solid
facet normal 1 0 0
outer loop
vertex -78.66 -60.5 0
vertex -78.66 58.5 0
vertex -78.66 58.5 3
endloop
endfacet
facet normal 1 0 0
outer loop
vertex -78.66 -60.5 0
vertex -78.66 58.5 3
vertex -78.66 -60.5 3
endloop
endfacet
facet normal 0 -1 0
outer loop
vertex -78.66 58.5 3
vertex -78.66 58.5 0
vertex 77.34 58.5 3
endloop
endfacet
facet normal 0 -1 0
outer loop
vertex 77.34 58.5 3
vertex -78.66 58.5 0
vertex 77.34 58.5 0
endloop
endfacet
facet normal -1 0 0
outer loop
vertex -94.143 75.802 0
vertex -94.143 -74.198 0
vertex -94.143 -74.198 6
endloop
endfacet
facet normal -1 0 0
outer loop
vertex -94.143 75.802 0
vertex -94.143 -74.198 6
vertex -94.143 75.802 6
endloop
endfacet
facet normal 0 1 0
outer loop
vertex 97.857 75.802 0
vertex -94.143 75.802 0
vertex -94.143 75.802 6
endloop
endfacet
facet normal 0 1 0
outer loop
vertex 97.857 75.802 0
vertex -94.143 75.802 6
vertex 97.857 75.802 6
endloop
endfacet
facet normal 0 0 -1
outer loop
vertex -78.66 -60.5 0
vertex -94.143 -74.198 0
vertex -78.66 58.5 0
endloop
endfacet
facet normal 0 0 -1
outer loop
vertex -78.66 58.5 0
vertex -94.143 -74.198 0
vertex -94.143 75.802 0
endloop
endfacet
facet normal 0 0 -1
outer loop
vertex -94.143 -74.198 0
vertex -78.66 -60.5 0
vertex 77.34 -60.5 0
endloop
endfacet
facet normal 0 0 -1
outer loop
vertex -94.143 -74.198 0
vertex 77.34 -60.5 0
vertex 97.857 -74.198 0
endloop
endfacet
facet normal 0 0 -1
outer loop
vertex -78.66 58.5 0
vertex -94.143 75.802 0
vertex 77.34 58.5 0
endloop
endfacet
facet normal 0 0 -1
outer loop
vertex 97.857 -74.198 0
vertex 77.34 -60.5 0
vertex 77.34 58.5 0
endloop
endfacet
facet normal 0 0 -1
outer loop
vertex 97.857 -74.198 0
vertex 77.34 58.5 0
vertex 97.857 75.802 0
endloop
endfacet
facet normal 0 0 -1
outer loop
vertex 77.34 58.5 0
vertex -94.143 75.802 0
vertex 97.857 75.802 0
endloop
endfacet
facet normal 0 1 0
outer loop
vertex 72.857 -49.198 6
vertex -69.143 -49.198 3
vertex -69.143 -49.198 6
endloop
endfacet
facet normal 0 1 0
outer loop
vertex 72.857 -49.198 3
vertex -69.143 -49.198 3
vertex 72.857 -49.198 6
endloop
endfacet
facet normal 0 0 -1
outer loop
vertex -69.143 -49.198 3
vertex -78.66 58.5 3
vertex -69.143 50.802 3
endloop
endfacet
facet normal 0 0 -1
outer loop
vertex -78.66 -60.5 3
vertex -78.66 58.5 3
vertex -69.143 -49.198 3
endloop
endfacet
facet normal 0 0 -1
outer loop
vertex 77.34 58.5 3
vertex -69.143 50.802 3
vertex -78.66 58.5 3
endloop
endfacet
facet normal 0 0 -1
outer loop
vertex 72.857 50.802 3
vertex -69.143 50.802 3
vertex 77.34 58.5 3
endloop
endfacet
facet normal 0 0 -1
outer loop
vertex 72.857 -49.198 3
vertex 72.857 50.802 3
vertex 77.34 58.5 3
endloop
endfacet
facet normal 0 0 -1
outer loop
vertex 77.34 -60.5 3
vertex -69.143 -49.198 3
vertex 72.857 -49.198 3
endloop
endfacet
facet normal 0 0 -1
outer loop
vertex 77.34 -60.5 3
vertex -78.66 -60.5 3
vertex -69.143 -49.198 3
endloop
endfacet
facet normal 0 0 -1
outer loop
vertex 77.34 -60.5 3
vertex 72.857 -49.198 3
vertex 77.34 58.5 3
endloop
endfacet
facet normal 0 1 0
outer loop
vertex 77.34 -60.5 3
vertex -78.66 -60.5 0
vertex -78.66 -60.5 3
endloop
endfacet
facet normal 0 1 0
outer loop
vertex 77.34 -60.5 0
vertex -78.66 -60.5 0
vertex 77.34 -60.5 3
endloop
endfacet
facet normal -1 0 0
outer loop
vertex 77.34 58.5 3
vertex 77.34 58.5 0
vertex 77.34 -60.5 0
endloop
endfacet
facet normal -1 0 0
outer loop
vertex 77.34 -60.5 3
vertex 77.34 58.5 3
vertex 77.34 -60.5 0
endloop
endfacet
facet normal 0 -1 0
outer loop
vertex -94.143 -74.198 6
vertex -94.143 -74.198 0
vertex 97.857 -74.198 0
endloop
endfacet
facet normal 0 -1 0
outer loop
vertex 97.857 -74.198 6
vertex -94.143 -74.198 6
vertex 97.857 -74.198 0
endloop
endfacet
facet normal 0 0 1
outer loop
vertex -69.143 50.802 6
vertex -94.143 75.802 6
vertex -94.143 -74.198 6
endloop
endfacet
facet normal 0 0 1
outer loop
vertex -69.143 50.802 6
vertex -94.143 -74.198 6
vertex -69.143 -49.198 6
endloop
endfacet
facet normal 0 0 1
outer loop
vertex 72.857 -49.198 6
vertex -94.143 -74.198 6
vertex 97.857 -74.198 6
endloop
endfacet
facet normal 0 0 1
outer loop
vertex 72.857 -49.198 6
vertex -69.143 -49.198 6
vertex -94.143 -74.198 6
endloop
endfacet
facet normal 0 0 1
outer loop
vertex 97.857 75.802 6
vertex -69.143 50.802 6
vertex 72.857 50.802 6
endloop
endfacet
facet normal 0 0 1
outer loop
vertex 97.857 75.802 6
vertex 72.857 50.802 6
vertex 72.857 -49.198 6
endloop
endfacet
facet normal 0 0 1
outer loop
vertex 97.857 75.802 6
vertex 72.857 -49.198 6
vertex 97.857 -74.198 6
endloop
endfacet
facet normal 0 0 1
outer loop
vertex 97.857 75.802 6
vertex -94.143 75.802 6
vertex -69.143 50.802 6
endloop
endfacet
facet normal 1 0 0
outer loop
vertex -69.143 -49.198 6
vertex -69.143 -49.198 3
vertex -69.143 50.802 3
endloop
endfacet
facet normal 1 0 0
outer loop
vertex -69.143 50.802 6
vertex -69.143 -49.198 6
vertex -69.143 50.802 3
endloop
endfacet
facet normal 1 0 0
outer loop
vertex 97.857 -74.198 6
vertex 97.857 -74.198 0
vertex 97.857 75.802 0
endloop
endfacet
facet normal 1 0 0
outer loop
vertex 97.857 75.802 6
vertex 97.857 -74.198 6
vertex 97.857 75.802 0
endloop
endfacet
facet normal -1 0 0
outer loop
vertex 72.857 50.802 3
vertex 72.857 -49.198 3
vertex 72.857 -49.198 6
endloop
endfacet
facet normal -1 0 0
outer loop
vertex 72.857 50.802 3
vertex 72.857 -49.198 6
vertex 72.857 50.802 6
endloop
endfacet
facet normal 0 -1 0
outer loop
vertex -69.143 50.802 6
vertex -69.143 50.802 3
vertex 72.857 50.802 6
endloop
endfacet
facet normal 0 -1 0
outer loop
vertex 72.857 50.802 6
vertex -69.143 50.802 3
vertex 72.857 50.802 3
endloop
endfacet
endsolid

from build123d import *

# Parameters (mm, degrees)
SKETCH_W     = 192
SKETCH_H     = 150
SKETCH_W_2   = 142
SKETCH_H_2   = 100
PAD_DEPTH    = 6
SKETCH001_W  = 156
SKETCH001_H  = 119
POCKET_DEPTH = 3


with BuildPart() as part:
    # Sketch → Pad (new body)
    with BuildSketch(Plane.XY):
        with Locations((1.856875, 0.802246)):
            Rectangle(SKETCH_W, SKETCH_H)
        with Locations((1.856875, 0.802246)):
            Rectangle(SKETCH_W_2, SKETCH_H_2, mode=Mode.SUBTRACT)
    extrude(amount=PAD_DEPTH)

    # Sketch001 (on Face9 of Pad) → Pocket (cut)
    with BuildSketch(Plane(origin=(0, 0, 0), x_dir=(1, 0, 0), z_dir=(0, 0, -1))):
        with Locations((-0.66, 1)):
            Rectangle(SKETCH001_W, SKETCH001_H)
    extrude(amount=-POCKET_DEPTH, mode=Mode.SUBTRACT)


solid = part.part
